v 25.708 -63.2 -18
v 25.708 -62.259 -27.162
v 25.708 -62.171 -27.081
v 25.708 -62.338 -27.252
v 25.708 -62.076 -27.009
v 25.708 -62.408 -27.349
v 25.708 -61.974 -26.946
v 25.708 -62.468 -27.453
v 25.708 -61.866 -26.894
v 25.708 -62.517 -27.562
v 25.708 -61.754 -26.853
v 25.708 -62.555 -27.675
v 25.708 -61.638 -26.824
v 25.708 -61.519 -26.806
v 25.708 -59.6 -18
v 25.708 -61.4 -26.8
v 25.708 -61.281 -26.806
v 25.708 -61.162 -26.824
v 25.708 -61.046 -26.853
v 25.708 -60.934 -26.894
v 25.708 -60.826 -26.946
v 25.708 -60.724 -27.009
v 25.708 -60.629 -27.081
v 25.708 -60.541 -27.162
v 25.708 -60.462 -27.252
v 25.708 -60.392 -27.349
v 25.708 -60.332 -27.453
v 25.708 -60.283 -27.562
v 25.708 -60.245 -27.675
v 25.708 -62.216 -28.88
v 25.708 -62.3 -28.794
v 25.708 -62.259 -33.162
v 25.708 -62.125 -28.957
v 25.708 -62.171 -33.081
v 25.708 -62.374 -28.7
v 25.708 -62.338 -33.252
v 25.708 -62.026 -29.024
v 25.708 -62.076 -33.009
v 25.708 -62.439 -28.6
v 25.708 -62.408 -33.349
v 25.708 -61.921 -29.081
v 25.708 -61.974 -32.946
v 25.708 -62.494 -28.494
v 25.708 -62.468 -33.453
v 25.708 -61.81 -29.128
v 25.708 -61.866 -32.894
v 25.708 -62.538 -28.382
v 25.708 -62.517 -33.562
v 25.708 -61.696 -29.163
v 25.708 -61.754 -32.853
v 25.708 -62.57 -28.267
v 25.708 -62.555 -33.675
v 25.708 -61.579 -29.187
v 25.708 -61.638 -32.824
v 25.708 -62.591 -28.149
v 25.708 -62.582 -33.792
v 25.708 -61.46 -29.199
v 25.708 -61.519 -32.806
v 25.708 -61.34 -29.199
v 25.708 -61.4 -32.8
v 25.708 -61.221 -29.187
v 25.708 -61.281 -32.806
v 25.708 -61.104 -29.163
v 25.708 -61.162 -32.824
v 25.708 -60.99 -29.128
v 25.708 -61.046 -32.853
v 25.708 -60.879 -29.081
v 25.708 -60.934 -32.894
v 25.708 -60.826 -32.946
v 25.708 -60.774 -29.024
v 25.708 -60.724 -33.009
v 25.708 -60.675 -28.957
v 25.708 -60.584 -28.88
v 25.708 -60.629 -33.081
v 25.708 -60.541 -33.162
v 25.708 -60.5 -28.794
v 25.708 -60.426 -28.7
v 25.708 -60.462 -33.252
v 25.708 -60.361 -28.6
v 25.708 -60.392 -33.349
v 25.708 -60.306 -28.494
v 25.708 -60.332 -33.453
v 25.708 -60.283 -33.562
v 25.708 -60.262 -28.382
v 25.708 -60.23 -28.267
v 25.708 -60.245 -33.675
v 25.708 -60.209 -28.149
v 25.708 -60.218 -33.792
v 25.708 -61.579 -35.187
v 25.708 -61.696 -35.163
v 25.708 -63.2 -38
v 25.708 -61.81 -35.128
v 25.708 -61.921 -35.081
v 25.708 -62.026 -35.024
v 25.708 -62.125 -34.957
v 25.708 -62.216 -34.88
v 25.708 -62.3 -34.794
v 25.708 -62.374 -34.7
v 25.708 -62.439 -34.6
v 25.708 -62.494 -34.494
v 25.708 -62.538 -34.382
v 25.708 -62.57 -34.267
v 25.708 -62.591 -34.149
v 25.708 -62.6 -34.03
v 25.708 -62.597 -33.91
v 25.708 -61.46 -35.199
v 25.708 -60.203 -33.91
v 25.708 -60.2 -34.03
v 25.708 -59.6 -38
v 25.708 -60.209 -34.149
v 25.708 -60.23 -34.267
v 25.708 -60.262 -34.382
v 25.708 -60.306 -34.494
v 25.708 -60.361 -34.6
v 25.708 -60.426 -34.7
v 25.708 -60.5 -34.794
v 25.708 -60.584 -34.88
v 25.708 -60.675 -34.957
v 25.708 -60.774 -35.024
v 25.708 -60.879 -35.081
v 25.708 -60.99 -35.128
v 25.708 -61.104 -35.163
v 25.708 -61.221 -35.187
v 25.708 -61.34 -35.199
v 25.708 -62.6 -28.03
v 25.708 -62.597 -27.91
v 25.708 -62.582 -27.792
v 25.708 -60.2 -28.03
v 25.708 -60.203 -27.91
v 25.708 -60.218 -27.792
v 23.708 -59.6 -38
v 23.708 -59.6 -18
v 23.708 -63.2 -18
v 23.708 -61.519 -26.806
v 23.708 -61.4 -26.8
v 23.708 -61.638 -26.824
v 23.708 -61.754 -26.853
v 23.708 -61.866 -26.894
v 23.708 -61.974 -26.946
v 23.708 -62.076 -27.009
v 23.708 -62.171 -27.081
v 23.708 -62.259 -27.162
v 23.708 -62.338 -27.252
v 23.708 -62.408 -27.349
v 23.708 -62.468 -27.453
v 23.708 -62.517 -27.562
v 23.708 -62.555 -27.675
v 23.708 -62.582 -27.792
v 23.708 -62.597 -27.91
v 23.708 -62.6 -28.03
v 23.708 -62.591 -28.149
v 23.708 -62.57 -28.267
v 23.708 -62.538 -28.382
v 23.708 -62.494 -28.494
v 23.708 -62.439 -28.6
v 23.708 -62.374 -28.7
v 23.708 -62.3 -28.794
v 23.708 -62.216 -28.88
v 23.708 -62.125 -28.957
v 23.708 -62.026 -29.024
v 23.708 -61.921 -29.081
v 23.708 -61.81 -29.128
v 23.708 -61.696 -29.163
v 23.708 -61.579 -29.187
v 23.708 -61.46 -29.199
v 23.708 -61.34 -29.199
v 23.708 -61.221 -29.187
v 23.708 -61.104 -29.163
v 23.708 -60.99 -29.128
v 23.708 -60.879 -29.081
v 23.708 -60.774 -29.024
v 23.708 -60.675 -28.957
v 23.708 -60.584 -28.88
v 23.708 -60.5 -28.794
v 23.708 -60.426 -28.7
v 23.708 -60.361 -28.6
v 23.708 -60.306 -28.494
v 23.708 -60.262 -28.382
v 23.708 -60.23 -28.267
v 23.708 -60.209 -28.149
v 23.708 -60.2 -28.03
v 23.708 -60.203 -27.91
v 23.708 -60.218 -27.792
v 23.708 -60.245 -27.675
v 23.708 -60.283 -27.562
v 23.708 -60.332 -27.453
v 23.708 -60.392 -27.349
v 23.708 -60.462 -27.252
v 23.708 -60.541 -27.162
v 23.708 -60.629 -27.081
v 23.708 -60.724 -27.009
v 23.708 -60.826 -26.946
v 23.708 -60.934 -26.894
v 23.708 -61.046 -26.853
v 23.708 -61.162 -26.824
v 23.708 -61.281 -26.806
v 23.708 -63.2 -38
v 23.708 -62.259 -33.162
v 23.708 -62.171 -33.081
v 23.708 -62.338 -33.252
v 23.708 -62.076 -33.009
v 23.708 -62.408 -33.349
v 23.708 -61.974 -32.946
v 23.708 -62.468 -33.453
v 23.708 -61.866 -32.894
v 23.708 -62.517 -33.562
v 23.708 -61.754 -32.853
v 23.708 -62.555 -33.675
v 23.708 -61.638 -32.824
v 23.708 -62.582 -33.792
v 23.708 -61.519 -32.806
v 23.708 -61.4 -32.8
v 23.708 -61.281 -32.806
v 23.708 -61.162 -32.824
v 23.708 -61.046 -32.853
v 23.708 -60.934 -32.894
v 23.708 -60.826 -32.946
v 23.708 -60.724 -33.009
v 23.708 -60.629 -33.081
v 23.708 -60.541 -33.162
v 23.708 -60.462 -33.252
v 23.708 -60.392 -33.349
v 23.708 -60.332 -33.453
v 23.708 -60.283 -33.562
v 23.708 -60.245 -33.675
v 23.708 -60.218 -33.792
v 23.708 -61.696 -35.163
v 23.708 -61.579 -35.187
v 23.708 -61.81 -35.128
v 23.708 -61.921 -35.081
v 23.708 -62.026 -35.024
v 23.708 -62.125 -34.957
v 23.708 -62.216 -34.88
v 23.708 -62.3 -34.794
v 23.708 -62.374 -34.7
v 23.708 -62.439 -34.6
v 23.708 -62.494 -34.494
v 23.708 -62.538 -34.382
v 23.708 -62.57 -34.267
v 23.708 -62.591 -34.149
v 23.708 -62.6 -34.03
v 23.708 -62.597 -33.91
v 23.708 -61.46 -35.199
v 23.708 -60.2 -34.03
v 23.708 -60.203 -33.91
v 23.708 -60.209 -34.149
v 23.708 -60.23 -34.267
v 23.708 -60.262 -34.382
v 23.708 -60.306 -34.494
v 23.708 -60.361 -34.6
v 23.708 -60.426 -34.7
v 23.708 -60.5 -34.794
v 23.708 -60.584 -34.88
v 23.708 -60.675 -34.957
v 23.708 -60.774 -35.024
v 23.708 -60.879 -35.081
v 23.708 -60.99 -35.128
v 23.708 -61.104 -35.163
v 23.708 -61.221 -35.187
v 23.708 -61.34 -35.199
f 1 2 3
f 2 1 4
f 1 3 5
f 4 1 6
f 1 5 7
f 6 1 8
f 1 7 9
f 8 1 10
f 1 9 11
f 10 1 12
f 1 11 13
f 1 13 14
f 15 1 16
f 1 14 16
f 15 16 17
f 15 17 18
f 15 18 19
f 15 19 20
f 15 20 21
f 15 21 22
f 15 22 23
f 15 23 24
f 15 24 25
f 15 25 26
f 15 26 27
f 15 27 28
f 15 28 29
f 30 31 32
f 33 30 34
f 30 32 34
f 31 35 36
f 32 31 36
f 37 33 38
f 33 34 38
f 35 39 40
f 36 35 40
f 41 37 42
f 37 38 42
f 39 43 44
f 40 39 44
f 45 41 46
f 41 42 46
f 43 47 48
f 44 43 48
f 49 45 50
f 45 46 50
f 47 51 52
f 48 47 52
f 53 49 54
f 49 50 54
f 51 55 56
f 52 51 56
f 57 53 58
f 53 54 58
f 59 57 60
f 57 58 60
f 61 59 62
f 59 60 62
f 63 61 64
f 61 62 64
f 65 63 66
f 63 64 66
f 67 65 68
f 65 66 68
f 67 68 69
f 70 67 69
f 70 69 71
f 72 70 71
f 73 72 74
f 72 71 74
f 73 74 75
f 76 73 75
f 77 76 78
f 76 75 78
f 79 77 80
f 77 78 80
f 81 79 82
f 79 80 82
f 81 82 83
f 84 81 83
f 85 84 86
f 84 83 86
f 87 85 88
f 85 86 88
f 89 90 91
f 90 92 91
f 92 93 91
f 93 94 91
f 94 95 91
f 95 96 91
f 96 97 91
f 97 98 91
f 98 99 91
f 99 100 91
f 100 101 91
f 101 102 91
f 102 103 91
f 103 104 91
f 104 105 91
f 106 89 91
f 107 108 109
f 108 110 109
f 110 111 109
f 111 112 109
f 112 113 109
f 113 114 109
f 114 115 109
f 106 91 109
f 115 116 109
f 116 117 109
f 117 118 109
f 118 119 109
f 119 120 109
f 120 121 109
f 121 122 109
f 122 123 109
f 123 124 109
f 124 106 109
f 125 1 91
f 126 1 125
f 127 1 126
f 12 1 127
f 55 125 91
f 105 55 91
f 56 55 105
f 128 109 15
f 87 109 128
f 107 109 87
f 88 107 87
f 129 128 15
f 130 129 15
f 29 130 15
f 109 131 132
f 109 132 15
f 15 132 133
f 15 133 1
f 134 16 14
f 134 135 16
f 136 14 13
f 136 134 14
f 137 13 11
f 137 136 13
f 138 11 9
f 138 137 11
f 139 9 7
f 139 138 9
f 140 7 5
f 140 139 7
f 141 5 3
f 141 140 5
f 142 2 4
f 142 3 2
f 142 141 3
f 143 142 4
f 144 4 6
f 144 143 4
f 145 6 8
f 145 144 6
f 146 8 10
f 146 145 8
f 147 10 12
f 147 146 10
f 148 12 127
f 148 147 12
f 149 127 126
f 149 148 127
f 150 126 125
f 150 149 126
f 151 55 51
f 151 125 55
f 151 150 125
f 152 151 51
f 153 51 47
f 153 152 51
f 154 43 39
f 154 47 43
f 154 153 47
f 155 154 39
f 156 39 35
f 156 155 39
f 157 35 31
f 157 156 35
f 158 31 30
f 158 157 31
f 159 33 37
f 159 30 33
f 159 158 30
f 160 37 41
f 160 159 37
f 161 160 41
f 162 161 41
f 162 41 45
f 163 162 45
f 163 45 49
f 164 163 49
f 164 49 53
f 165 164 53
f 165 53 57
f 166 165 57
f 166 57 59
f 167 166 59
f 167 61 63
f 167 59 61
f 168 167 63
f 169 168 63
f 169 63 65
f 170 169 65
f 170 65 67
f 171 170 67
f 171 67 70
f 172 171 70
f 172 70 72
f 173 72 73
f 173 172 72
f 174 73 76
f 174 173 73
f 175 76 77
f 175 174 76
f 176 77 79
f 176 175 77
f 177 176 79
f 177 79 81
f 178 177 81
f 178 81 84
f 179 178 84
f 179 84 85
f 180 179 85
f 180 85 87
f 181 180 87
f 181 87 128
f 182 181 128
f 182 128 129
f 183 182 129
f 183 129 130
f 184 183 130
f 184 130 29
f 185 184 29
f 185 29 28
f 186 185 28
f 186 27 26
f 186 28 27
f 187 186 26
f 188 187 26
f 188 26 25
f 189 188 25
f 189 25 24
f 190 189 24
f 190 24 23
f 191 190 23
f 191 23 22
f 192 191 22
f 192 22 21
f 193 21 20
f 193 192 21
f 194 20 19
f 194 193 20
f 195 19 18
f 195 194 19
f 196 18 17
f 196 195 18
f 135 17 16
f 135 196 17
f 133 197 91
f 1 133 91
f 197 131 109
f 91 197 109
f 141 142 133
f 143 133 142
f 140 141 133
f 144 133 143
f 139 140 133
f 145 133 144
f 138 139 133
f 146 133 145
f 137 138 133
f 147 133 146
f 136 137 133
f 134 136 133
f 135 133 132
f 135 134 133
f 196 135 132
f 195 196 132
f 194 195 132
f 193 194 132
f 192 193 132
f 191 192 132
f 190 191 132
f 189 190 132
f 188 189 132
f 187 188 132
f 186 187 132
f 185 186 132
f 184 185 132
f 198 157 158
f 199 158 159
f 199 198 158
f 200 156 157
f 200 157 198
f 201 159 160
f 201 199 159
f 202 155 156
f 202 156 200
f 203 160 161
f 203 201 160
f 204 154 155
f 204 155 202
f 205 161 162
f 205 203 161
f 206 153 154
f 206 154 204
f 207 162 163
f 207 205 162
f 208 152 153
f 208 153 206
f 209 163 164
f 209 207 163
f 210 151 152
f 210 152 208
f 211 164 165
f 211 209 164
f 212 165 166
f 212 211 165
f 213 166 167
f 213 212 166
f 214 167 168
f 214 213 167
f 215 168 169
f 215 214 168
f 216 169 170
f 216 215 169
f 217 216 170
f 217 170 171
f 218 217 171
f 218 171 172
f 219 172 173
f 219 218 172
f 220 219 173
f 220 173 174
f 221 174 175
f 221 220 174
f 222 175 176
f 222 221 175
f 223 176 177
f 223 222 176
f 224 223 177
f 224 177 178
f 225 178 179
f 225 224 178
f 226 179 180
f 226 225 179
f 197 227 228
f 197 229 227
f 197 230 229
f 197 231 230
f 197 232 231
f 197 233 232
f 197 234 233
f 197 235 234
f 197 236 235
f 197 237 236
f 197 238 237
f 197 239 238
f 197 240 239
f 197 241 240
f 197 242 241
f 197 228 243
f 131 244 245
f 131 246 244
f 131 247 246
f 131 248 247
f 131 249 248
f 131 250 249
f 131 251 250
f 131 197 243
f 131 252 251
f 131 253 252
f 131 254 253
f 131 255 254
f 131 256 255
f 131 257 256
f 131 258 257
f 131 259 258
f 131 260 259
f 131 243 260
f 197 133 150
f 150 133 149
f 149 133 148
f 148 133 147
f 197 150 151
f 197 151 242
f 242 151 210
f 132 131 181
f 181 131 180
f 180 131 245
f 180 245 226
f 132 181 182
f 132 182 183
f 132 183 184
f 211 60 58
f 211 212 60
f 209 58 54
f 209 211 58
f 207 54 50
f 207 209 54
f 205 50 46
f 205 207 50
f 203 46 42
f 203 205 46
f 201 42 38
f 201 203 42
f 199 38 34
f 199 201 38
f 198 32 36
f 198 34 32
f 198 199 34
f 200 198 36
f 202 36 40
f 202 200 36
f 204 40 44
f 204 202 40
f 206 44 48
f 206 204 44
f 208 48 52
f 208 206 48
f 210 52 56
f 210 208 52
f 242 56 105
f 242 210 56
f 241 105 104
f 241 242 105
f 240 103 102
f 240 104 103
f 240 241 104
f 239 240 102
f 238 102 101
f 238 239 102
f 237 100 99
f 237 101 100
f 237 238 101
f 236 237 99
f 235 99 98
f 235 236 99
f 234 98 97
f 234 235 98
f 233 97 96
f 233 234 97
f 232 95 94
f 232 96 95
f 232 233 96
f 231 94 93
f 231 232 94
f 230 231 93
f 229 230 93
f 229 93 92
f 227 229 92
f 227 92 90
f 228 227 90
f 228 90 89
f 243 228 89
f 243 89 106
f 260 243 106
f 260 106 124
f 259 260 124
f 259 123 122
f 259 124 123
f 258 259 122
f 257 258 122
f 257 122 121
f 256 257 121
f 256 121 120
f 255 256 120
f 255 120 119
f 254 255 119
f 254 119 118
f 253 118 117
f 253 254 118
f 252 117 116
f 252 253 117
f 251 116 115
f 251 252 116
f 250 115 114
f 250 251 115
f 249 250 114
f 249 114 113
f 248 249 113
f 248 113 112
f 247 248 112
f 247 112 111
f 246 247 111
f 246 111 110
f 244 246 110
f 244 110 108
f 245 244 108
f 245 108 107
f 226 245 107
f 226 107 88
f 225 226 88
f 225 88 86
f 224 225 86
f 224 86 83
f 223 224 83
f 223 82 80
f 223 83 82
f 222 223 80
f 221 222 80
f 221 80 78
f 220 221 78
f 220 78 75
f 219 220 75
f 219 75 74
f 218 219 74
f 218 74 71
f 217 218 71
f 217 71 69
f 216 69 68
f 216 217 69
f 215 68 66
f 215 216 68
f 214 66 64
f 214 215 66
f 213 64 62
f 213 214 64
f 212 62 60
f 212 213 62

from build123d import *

# Parameters (mm, degrees)
STOP_PLATE_BLANK_SKETCH_W    = 2
STOP_PLATE_BLANK_SKETCH_H    = 3.6
STOP_PLATE_BLANK_DEPTH       = 20
M2_STOP_CLEARANCE_1_SKETCH_R = 1.2
M2_STOP_CLEARANCE_1_DEPTH    = 2.2
M2_STOP_CLEARANCE_2_SKETCH_R = 1.2
M2_STOP_CLEARANCE_2_DEPTH    = 2.2


with BuildPart() as part:
    # Stop plate blank sketch → Stop plate blank (new body)
    with BuildSketch(Plane.XY.offset(-38)):
        with Locations((24.708348754, -61.4)):
            Rectangle(STOP_PLATE_BLANK_SKETCH_W, STOP_PLATE_BLANK_SKETCH_H)
    extrude(amount=STOP_PLATE_BLANK_DEPTH)

    # M2 stop clearance 1 sketch → M2 stop clearance 1 (cut)
    with BuildSketch(Plane(origin=(23.608348754, 0, 0), x_dir=(0, 0, -1), z_dir=(1, 0, 0))):
        with Locations(Location((34, -61.4, 0), (0, 0, 180))):
            Circle(M2_STOP_CLEARANCE_1_SKETCH_R)
    extrude(amount=M2_STOP_CLEARANCE_1_DEPTH, mode=Mode.SUBTRACT)

    # M2 stop clearance 2 sketch → M2 stop clearance 2 (cut)
    with BuildSketch(Plane(origin=(23.608348754, 0, 0), x_dir=(0, 0, -1), z_dir=(1, 0, 0))):
        with Locations(Location((28, -61.4, 0), (0, 0, 180))):
            Circle(M2_STOP_CLEARANCE_2_SKETCH_R)
    extrude(amount=M2_STOP_CLEARANCE_2_DEPTH, mode=Mode.SUBTRACT)


solid = part.part
